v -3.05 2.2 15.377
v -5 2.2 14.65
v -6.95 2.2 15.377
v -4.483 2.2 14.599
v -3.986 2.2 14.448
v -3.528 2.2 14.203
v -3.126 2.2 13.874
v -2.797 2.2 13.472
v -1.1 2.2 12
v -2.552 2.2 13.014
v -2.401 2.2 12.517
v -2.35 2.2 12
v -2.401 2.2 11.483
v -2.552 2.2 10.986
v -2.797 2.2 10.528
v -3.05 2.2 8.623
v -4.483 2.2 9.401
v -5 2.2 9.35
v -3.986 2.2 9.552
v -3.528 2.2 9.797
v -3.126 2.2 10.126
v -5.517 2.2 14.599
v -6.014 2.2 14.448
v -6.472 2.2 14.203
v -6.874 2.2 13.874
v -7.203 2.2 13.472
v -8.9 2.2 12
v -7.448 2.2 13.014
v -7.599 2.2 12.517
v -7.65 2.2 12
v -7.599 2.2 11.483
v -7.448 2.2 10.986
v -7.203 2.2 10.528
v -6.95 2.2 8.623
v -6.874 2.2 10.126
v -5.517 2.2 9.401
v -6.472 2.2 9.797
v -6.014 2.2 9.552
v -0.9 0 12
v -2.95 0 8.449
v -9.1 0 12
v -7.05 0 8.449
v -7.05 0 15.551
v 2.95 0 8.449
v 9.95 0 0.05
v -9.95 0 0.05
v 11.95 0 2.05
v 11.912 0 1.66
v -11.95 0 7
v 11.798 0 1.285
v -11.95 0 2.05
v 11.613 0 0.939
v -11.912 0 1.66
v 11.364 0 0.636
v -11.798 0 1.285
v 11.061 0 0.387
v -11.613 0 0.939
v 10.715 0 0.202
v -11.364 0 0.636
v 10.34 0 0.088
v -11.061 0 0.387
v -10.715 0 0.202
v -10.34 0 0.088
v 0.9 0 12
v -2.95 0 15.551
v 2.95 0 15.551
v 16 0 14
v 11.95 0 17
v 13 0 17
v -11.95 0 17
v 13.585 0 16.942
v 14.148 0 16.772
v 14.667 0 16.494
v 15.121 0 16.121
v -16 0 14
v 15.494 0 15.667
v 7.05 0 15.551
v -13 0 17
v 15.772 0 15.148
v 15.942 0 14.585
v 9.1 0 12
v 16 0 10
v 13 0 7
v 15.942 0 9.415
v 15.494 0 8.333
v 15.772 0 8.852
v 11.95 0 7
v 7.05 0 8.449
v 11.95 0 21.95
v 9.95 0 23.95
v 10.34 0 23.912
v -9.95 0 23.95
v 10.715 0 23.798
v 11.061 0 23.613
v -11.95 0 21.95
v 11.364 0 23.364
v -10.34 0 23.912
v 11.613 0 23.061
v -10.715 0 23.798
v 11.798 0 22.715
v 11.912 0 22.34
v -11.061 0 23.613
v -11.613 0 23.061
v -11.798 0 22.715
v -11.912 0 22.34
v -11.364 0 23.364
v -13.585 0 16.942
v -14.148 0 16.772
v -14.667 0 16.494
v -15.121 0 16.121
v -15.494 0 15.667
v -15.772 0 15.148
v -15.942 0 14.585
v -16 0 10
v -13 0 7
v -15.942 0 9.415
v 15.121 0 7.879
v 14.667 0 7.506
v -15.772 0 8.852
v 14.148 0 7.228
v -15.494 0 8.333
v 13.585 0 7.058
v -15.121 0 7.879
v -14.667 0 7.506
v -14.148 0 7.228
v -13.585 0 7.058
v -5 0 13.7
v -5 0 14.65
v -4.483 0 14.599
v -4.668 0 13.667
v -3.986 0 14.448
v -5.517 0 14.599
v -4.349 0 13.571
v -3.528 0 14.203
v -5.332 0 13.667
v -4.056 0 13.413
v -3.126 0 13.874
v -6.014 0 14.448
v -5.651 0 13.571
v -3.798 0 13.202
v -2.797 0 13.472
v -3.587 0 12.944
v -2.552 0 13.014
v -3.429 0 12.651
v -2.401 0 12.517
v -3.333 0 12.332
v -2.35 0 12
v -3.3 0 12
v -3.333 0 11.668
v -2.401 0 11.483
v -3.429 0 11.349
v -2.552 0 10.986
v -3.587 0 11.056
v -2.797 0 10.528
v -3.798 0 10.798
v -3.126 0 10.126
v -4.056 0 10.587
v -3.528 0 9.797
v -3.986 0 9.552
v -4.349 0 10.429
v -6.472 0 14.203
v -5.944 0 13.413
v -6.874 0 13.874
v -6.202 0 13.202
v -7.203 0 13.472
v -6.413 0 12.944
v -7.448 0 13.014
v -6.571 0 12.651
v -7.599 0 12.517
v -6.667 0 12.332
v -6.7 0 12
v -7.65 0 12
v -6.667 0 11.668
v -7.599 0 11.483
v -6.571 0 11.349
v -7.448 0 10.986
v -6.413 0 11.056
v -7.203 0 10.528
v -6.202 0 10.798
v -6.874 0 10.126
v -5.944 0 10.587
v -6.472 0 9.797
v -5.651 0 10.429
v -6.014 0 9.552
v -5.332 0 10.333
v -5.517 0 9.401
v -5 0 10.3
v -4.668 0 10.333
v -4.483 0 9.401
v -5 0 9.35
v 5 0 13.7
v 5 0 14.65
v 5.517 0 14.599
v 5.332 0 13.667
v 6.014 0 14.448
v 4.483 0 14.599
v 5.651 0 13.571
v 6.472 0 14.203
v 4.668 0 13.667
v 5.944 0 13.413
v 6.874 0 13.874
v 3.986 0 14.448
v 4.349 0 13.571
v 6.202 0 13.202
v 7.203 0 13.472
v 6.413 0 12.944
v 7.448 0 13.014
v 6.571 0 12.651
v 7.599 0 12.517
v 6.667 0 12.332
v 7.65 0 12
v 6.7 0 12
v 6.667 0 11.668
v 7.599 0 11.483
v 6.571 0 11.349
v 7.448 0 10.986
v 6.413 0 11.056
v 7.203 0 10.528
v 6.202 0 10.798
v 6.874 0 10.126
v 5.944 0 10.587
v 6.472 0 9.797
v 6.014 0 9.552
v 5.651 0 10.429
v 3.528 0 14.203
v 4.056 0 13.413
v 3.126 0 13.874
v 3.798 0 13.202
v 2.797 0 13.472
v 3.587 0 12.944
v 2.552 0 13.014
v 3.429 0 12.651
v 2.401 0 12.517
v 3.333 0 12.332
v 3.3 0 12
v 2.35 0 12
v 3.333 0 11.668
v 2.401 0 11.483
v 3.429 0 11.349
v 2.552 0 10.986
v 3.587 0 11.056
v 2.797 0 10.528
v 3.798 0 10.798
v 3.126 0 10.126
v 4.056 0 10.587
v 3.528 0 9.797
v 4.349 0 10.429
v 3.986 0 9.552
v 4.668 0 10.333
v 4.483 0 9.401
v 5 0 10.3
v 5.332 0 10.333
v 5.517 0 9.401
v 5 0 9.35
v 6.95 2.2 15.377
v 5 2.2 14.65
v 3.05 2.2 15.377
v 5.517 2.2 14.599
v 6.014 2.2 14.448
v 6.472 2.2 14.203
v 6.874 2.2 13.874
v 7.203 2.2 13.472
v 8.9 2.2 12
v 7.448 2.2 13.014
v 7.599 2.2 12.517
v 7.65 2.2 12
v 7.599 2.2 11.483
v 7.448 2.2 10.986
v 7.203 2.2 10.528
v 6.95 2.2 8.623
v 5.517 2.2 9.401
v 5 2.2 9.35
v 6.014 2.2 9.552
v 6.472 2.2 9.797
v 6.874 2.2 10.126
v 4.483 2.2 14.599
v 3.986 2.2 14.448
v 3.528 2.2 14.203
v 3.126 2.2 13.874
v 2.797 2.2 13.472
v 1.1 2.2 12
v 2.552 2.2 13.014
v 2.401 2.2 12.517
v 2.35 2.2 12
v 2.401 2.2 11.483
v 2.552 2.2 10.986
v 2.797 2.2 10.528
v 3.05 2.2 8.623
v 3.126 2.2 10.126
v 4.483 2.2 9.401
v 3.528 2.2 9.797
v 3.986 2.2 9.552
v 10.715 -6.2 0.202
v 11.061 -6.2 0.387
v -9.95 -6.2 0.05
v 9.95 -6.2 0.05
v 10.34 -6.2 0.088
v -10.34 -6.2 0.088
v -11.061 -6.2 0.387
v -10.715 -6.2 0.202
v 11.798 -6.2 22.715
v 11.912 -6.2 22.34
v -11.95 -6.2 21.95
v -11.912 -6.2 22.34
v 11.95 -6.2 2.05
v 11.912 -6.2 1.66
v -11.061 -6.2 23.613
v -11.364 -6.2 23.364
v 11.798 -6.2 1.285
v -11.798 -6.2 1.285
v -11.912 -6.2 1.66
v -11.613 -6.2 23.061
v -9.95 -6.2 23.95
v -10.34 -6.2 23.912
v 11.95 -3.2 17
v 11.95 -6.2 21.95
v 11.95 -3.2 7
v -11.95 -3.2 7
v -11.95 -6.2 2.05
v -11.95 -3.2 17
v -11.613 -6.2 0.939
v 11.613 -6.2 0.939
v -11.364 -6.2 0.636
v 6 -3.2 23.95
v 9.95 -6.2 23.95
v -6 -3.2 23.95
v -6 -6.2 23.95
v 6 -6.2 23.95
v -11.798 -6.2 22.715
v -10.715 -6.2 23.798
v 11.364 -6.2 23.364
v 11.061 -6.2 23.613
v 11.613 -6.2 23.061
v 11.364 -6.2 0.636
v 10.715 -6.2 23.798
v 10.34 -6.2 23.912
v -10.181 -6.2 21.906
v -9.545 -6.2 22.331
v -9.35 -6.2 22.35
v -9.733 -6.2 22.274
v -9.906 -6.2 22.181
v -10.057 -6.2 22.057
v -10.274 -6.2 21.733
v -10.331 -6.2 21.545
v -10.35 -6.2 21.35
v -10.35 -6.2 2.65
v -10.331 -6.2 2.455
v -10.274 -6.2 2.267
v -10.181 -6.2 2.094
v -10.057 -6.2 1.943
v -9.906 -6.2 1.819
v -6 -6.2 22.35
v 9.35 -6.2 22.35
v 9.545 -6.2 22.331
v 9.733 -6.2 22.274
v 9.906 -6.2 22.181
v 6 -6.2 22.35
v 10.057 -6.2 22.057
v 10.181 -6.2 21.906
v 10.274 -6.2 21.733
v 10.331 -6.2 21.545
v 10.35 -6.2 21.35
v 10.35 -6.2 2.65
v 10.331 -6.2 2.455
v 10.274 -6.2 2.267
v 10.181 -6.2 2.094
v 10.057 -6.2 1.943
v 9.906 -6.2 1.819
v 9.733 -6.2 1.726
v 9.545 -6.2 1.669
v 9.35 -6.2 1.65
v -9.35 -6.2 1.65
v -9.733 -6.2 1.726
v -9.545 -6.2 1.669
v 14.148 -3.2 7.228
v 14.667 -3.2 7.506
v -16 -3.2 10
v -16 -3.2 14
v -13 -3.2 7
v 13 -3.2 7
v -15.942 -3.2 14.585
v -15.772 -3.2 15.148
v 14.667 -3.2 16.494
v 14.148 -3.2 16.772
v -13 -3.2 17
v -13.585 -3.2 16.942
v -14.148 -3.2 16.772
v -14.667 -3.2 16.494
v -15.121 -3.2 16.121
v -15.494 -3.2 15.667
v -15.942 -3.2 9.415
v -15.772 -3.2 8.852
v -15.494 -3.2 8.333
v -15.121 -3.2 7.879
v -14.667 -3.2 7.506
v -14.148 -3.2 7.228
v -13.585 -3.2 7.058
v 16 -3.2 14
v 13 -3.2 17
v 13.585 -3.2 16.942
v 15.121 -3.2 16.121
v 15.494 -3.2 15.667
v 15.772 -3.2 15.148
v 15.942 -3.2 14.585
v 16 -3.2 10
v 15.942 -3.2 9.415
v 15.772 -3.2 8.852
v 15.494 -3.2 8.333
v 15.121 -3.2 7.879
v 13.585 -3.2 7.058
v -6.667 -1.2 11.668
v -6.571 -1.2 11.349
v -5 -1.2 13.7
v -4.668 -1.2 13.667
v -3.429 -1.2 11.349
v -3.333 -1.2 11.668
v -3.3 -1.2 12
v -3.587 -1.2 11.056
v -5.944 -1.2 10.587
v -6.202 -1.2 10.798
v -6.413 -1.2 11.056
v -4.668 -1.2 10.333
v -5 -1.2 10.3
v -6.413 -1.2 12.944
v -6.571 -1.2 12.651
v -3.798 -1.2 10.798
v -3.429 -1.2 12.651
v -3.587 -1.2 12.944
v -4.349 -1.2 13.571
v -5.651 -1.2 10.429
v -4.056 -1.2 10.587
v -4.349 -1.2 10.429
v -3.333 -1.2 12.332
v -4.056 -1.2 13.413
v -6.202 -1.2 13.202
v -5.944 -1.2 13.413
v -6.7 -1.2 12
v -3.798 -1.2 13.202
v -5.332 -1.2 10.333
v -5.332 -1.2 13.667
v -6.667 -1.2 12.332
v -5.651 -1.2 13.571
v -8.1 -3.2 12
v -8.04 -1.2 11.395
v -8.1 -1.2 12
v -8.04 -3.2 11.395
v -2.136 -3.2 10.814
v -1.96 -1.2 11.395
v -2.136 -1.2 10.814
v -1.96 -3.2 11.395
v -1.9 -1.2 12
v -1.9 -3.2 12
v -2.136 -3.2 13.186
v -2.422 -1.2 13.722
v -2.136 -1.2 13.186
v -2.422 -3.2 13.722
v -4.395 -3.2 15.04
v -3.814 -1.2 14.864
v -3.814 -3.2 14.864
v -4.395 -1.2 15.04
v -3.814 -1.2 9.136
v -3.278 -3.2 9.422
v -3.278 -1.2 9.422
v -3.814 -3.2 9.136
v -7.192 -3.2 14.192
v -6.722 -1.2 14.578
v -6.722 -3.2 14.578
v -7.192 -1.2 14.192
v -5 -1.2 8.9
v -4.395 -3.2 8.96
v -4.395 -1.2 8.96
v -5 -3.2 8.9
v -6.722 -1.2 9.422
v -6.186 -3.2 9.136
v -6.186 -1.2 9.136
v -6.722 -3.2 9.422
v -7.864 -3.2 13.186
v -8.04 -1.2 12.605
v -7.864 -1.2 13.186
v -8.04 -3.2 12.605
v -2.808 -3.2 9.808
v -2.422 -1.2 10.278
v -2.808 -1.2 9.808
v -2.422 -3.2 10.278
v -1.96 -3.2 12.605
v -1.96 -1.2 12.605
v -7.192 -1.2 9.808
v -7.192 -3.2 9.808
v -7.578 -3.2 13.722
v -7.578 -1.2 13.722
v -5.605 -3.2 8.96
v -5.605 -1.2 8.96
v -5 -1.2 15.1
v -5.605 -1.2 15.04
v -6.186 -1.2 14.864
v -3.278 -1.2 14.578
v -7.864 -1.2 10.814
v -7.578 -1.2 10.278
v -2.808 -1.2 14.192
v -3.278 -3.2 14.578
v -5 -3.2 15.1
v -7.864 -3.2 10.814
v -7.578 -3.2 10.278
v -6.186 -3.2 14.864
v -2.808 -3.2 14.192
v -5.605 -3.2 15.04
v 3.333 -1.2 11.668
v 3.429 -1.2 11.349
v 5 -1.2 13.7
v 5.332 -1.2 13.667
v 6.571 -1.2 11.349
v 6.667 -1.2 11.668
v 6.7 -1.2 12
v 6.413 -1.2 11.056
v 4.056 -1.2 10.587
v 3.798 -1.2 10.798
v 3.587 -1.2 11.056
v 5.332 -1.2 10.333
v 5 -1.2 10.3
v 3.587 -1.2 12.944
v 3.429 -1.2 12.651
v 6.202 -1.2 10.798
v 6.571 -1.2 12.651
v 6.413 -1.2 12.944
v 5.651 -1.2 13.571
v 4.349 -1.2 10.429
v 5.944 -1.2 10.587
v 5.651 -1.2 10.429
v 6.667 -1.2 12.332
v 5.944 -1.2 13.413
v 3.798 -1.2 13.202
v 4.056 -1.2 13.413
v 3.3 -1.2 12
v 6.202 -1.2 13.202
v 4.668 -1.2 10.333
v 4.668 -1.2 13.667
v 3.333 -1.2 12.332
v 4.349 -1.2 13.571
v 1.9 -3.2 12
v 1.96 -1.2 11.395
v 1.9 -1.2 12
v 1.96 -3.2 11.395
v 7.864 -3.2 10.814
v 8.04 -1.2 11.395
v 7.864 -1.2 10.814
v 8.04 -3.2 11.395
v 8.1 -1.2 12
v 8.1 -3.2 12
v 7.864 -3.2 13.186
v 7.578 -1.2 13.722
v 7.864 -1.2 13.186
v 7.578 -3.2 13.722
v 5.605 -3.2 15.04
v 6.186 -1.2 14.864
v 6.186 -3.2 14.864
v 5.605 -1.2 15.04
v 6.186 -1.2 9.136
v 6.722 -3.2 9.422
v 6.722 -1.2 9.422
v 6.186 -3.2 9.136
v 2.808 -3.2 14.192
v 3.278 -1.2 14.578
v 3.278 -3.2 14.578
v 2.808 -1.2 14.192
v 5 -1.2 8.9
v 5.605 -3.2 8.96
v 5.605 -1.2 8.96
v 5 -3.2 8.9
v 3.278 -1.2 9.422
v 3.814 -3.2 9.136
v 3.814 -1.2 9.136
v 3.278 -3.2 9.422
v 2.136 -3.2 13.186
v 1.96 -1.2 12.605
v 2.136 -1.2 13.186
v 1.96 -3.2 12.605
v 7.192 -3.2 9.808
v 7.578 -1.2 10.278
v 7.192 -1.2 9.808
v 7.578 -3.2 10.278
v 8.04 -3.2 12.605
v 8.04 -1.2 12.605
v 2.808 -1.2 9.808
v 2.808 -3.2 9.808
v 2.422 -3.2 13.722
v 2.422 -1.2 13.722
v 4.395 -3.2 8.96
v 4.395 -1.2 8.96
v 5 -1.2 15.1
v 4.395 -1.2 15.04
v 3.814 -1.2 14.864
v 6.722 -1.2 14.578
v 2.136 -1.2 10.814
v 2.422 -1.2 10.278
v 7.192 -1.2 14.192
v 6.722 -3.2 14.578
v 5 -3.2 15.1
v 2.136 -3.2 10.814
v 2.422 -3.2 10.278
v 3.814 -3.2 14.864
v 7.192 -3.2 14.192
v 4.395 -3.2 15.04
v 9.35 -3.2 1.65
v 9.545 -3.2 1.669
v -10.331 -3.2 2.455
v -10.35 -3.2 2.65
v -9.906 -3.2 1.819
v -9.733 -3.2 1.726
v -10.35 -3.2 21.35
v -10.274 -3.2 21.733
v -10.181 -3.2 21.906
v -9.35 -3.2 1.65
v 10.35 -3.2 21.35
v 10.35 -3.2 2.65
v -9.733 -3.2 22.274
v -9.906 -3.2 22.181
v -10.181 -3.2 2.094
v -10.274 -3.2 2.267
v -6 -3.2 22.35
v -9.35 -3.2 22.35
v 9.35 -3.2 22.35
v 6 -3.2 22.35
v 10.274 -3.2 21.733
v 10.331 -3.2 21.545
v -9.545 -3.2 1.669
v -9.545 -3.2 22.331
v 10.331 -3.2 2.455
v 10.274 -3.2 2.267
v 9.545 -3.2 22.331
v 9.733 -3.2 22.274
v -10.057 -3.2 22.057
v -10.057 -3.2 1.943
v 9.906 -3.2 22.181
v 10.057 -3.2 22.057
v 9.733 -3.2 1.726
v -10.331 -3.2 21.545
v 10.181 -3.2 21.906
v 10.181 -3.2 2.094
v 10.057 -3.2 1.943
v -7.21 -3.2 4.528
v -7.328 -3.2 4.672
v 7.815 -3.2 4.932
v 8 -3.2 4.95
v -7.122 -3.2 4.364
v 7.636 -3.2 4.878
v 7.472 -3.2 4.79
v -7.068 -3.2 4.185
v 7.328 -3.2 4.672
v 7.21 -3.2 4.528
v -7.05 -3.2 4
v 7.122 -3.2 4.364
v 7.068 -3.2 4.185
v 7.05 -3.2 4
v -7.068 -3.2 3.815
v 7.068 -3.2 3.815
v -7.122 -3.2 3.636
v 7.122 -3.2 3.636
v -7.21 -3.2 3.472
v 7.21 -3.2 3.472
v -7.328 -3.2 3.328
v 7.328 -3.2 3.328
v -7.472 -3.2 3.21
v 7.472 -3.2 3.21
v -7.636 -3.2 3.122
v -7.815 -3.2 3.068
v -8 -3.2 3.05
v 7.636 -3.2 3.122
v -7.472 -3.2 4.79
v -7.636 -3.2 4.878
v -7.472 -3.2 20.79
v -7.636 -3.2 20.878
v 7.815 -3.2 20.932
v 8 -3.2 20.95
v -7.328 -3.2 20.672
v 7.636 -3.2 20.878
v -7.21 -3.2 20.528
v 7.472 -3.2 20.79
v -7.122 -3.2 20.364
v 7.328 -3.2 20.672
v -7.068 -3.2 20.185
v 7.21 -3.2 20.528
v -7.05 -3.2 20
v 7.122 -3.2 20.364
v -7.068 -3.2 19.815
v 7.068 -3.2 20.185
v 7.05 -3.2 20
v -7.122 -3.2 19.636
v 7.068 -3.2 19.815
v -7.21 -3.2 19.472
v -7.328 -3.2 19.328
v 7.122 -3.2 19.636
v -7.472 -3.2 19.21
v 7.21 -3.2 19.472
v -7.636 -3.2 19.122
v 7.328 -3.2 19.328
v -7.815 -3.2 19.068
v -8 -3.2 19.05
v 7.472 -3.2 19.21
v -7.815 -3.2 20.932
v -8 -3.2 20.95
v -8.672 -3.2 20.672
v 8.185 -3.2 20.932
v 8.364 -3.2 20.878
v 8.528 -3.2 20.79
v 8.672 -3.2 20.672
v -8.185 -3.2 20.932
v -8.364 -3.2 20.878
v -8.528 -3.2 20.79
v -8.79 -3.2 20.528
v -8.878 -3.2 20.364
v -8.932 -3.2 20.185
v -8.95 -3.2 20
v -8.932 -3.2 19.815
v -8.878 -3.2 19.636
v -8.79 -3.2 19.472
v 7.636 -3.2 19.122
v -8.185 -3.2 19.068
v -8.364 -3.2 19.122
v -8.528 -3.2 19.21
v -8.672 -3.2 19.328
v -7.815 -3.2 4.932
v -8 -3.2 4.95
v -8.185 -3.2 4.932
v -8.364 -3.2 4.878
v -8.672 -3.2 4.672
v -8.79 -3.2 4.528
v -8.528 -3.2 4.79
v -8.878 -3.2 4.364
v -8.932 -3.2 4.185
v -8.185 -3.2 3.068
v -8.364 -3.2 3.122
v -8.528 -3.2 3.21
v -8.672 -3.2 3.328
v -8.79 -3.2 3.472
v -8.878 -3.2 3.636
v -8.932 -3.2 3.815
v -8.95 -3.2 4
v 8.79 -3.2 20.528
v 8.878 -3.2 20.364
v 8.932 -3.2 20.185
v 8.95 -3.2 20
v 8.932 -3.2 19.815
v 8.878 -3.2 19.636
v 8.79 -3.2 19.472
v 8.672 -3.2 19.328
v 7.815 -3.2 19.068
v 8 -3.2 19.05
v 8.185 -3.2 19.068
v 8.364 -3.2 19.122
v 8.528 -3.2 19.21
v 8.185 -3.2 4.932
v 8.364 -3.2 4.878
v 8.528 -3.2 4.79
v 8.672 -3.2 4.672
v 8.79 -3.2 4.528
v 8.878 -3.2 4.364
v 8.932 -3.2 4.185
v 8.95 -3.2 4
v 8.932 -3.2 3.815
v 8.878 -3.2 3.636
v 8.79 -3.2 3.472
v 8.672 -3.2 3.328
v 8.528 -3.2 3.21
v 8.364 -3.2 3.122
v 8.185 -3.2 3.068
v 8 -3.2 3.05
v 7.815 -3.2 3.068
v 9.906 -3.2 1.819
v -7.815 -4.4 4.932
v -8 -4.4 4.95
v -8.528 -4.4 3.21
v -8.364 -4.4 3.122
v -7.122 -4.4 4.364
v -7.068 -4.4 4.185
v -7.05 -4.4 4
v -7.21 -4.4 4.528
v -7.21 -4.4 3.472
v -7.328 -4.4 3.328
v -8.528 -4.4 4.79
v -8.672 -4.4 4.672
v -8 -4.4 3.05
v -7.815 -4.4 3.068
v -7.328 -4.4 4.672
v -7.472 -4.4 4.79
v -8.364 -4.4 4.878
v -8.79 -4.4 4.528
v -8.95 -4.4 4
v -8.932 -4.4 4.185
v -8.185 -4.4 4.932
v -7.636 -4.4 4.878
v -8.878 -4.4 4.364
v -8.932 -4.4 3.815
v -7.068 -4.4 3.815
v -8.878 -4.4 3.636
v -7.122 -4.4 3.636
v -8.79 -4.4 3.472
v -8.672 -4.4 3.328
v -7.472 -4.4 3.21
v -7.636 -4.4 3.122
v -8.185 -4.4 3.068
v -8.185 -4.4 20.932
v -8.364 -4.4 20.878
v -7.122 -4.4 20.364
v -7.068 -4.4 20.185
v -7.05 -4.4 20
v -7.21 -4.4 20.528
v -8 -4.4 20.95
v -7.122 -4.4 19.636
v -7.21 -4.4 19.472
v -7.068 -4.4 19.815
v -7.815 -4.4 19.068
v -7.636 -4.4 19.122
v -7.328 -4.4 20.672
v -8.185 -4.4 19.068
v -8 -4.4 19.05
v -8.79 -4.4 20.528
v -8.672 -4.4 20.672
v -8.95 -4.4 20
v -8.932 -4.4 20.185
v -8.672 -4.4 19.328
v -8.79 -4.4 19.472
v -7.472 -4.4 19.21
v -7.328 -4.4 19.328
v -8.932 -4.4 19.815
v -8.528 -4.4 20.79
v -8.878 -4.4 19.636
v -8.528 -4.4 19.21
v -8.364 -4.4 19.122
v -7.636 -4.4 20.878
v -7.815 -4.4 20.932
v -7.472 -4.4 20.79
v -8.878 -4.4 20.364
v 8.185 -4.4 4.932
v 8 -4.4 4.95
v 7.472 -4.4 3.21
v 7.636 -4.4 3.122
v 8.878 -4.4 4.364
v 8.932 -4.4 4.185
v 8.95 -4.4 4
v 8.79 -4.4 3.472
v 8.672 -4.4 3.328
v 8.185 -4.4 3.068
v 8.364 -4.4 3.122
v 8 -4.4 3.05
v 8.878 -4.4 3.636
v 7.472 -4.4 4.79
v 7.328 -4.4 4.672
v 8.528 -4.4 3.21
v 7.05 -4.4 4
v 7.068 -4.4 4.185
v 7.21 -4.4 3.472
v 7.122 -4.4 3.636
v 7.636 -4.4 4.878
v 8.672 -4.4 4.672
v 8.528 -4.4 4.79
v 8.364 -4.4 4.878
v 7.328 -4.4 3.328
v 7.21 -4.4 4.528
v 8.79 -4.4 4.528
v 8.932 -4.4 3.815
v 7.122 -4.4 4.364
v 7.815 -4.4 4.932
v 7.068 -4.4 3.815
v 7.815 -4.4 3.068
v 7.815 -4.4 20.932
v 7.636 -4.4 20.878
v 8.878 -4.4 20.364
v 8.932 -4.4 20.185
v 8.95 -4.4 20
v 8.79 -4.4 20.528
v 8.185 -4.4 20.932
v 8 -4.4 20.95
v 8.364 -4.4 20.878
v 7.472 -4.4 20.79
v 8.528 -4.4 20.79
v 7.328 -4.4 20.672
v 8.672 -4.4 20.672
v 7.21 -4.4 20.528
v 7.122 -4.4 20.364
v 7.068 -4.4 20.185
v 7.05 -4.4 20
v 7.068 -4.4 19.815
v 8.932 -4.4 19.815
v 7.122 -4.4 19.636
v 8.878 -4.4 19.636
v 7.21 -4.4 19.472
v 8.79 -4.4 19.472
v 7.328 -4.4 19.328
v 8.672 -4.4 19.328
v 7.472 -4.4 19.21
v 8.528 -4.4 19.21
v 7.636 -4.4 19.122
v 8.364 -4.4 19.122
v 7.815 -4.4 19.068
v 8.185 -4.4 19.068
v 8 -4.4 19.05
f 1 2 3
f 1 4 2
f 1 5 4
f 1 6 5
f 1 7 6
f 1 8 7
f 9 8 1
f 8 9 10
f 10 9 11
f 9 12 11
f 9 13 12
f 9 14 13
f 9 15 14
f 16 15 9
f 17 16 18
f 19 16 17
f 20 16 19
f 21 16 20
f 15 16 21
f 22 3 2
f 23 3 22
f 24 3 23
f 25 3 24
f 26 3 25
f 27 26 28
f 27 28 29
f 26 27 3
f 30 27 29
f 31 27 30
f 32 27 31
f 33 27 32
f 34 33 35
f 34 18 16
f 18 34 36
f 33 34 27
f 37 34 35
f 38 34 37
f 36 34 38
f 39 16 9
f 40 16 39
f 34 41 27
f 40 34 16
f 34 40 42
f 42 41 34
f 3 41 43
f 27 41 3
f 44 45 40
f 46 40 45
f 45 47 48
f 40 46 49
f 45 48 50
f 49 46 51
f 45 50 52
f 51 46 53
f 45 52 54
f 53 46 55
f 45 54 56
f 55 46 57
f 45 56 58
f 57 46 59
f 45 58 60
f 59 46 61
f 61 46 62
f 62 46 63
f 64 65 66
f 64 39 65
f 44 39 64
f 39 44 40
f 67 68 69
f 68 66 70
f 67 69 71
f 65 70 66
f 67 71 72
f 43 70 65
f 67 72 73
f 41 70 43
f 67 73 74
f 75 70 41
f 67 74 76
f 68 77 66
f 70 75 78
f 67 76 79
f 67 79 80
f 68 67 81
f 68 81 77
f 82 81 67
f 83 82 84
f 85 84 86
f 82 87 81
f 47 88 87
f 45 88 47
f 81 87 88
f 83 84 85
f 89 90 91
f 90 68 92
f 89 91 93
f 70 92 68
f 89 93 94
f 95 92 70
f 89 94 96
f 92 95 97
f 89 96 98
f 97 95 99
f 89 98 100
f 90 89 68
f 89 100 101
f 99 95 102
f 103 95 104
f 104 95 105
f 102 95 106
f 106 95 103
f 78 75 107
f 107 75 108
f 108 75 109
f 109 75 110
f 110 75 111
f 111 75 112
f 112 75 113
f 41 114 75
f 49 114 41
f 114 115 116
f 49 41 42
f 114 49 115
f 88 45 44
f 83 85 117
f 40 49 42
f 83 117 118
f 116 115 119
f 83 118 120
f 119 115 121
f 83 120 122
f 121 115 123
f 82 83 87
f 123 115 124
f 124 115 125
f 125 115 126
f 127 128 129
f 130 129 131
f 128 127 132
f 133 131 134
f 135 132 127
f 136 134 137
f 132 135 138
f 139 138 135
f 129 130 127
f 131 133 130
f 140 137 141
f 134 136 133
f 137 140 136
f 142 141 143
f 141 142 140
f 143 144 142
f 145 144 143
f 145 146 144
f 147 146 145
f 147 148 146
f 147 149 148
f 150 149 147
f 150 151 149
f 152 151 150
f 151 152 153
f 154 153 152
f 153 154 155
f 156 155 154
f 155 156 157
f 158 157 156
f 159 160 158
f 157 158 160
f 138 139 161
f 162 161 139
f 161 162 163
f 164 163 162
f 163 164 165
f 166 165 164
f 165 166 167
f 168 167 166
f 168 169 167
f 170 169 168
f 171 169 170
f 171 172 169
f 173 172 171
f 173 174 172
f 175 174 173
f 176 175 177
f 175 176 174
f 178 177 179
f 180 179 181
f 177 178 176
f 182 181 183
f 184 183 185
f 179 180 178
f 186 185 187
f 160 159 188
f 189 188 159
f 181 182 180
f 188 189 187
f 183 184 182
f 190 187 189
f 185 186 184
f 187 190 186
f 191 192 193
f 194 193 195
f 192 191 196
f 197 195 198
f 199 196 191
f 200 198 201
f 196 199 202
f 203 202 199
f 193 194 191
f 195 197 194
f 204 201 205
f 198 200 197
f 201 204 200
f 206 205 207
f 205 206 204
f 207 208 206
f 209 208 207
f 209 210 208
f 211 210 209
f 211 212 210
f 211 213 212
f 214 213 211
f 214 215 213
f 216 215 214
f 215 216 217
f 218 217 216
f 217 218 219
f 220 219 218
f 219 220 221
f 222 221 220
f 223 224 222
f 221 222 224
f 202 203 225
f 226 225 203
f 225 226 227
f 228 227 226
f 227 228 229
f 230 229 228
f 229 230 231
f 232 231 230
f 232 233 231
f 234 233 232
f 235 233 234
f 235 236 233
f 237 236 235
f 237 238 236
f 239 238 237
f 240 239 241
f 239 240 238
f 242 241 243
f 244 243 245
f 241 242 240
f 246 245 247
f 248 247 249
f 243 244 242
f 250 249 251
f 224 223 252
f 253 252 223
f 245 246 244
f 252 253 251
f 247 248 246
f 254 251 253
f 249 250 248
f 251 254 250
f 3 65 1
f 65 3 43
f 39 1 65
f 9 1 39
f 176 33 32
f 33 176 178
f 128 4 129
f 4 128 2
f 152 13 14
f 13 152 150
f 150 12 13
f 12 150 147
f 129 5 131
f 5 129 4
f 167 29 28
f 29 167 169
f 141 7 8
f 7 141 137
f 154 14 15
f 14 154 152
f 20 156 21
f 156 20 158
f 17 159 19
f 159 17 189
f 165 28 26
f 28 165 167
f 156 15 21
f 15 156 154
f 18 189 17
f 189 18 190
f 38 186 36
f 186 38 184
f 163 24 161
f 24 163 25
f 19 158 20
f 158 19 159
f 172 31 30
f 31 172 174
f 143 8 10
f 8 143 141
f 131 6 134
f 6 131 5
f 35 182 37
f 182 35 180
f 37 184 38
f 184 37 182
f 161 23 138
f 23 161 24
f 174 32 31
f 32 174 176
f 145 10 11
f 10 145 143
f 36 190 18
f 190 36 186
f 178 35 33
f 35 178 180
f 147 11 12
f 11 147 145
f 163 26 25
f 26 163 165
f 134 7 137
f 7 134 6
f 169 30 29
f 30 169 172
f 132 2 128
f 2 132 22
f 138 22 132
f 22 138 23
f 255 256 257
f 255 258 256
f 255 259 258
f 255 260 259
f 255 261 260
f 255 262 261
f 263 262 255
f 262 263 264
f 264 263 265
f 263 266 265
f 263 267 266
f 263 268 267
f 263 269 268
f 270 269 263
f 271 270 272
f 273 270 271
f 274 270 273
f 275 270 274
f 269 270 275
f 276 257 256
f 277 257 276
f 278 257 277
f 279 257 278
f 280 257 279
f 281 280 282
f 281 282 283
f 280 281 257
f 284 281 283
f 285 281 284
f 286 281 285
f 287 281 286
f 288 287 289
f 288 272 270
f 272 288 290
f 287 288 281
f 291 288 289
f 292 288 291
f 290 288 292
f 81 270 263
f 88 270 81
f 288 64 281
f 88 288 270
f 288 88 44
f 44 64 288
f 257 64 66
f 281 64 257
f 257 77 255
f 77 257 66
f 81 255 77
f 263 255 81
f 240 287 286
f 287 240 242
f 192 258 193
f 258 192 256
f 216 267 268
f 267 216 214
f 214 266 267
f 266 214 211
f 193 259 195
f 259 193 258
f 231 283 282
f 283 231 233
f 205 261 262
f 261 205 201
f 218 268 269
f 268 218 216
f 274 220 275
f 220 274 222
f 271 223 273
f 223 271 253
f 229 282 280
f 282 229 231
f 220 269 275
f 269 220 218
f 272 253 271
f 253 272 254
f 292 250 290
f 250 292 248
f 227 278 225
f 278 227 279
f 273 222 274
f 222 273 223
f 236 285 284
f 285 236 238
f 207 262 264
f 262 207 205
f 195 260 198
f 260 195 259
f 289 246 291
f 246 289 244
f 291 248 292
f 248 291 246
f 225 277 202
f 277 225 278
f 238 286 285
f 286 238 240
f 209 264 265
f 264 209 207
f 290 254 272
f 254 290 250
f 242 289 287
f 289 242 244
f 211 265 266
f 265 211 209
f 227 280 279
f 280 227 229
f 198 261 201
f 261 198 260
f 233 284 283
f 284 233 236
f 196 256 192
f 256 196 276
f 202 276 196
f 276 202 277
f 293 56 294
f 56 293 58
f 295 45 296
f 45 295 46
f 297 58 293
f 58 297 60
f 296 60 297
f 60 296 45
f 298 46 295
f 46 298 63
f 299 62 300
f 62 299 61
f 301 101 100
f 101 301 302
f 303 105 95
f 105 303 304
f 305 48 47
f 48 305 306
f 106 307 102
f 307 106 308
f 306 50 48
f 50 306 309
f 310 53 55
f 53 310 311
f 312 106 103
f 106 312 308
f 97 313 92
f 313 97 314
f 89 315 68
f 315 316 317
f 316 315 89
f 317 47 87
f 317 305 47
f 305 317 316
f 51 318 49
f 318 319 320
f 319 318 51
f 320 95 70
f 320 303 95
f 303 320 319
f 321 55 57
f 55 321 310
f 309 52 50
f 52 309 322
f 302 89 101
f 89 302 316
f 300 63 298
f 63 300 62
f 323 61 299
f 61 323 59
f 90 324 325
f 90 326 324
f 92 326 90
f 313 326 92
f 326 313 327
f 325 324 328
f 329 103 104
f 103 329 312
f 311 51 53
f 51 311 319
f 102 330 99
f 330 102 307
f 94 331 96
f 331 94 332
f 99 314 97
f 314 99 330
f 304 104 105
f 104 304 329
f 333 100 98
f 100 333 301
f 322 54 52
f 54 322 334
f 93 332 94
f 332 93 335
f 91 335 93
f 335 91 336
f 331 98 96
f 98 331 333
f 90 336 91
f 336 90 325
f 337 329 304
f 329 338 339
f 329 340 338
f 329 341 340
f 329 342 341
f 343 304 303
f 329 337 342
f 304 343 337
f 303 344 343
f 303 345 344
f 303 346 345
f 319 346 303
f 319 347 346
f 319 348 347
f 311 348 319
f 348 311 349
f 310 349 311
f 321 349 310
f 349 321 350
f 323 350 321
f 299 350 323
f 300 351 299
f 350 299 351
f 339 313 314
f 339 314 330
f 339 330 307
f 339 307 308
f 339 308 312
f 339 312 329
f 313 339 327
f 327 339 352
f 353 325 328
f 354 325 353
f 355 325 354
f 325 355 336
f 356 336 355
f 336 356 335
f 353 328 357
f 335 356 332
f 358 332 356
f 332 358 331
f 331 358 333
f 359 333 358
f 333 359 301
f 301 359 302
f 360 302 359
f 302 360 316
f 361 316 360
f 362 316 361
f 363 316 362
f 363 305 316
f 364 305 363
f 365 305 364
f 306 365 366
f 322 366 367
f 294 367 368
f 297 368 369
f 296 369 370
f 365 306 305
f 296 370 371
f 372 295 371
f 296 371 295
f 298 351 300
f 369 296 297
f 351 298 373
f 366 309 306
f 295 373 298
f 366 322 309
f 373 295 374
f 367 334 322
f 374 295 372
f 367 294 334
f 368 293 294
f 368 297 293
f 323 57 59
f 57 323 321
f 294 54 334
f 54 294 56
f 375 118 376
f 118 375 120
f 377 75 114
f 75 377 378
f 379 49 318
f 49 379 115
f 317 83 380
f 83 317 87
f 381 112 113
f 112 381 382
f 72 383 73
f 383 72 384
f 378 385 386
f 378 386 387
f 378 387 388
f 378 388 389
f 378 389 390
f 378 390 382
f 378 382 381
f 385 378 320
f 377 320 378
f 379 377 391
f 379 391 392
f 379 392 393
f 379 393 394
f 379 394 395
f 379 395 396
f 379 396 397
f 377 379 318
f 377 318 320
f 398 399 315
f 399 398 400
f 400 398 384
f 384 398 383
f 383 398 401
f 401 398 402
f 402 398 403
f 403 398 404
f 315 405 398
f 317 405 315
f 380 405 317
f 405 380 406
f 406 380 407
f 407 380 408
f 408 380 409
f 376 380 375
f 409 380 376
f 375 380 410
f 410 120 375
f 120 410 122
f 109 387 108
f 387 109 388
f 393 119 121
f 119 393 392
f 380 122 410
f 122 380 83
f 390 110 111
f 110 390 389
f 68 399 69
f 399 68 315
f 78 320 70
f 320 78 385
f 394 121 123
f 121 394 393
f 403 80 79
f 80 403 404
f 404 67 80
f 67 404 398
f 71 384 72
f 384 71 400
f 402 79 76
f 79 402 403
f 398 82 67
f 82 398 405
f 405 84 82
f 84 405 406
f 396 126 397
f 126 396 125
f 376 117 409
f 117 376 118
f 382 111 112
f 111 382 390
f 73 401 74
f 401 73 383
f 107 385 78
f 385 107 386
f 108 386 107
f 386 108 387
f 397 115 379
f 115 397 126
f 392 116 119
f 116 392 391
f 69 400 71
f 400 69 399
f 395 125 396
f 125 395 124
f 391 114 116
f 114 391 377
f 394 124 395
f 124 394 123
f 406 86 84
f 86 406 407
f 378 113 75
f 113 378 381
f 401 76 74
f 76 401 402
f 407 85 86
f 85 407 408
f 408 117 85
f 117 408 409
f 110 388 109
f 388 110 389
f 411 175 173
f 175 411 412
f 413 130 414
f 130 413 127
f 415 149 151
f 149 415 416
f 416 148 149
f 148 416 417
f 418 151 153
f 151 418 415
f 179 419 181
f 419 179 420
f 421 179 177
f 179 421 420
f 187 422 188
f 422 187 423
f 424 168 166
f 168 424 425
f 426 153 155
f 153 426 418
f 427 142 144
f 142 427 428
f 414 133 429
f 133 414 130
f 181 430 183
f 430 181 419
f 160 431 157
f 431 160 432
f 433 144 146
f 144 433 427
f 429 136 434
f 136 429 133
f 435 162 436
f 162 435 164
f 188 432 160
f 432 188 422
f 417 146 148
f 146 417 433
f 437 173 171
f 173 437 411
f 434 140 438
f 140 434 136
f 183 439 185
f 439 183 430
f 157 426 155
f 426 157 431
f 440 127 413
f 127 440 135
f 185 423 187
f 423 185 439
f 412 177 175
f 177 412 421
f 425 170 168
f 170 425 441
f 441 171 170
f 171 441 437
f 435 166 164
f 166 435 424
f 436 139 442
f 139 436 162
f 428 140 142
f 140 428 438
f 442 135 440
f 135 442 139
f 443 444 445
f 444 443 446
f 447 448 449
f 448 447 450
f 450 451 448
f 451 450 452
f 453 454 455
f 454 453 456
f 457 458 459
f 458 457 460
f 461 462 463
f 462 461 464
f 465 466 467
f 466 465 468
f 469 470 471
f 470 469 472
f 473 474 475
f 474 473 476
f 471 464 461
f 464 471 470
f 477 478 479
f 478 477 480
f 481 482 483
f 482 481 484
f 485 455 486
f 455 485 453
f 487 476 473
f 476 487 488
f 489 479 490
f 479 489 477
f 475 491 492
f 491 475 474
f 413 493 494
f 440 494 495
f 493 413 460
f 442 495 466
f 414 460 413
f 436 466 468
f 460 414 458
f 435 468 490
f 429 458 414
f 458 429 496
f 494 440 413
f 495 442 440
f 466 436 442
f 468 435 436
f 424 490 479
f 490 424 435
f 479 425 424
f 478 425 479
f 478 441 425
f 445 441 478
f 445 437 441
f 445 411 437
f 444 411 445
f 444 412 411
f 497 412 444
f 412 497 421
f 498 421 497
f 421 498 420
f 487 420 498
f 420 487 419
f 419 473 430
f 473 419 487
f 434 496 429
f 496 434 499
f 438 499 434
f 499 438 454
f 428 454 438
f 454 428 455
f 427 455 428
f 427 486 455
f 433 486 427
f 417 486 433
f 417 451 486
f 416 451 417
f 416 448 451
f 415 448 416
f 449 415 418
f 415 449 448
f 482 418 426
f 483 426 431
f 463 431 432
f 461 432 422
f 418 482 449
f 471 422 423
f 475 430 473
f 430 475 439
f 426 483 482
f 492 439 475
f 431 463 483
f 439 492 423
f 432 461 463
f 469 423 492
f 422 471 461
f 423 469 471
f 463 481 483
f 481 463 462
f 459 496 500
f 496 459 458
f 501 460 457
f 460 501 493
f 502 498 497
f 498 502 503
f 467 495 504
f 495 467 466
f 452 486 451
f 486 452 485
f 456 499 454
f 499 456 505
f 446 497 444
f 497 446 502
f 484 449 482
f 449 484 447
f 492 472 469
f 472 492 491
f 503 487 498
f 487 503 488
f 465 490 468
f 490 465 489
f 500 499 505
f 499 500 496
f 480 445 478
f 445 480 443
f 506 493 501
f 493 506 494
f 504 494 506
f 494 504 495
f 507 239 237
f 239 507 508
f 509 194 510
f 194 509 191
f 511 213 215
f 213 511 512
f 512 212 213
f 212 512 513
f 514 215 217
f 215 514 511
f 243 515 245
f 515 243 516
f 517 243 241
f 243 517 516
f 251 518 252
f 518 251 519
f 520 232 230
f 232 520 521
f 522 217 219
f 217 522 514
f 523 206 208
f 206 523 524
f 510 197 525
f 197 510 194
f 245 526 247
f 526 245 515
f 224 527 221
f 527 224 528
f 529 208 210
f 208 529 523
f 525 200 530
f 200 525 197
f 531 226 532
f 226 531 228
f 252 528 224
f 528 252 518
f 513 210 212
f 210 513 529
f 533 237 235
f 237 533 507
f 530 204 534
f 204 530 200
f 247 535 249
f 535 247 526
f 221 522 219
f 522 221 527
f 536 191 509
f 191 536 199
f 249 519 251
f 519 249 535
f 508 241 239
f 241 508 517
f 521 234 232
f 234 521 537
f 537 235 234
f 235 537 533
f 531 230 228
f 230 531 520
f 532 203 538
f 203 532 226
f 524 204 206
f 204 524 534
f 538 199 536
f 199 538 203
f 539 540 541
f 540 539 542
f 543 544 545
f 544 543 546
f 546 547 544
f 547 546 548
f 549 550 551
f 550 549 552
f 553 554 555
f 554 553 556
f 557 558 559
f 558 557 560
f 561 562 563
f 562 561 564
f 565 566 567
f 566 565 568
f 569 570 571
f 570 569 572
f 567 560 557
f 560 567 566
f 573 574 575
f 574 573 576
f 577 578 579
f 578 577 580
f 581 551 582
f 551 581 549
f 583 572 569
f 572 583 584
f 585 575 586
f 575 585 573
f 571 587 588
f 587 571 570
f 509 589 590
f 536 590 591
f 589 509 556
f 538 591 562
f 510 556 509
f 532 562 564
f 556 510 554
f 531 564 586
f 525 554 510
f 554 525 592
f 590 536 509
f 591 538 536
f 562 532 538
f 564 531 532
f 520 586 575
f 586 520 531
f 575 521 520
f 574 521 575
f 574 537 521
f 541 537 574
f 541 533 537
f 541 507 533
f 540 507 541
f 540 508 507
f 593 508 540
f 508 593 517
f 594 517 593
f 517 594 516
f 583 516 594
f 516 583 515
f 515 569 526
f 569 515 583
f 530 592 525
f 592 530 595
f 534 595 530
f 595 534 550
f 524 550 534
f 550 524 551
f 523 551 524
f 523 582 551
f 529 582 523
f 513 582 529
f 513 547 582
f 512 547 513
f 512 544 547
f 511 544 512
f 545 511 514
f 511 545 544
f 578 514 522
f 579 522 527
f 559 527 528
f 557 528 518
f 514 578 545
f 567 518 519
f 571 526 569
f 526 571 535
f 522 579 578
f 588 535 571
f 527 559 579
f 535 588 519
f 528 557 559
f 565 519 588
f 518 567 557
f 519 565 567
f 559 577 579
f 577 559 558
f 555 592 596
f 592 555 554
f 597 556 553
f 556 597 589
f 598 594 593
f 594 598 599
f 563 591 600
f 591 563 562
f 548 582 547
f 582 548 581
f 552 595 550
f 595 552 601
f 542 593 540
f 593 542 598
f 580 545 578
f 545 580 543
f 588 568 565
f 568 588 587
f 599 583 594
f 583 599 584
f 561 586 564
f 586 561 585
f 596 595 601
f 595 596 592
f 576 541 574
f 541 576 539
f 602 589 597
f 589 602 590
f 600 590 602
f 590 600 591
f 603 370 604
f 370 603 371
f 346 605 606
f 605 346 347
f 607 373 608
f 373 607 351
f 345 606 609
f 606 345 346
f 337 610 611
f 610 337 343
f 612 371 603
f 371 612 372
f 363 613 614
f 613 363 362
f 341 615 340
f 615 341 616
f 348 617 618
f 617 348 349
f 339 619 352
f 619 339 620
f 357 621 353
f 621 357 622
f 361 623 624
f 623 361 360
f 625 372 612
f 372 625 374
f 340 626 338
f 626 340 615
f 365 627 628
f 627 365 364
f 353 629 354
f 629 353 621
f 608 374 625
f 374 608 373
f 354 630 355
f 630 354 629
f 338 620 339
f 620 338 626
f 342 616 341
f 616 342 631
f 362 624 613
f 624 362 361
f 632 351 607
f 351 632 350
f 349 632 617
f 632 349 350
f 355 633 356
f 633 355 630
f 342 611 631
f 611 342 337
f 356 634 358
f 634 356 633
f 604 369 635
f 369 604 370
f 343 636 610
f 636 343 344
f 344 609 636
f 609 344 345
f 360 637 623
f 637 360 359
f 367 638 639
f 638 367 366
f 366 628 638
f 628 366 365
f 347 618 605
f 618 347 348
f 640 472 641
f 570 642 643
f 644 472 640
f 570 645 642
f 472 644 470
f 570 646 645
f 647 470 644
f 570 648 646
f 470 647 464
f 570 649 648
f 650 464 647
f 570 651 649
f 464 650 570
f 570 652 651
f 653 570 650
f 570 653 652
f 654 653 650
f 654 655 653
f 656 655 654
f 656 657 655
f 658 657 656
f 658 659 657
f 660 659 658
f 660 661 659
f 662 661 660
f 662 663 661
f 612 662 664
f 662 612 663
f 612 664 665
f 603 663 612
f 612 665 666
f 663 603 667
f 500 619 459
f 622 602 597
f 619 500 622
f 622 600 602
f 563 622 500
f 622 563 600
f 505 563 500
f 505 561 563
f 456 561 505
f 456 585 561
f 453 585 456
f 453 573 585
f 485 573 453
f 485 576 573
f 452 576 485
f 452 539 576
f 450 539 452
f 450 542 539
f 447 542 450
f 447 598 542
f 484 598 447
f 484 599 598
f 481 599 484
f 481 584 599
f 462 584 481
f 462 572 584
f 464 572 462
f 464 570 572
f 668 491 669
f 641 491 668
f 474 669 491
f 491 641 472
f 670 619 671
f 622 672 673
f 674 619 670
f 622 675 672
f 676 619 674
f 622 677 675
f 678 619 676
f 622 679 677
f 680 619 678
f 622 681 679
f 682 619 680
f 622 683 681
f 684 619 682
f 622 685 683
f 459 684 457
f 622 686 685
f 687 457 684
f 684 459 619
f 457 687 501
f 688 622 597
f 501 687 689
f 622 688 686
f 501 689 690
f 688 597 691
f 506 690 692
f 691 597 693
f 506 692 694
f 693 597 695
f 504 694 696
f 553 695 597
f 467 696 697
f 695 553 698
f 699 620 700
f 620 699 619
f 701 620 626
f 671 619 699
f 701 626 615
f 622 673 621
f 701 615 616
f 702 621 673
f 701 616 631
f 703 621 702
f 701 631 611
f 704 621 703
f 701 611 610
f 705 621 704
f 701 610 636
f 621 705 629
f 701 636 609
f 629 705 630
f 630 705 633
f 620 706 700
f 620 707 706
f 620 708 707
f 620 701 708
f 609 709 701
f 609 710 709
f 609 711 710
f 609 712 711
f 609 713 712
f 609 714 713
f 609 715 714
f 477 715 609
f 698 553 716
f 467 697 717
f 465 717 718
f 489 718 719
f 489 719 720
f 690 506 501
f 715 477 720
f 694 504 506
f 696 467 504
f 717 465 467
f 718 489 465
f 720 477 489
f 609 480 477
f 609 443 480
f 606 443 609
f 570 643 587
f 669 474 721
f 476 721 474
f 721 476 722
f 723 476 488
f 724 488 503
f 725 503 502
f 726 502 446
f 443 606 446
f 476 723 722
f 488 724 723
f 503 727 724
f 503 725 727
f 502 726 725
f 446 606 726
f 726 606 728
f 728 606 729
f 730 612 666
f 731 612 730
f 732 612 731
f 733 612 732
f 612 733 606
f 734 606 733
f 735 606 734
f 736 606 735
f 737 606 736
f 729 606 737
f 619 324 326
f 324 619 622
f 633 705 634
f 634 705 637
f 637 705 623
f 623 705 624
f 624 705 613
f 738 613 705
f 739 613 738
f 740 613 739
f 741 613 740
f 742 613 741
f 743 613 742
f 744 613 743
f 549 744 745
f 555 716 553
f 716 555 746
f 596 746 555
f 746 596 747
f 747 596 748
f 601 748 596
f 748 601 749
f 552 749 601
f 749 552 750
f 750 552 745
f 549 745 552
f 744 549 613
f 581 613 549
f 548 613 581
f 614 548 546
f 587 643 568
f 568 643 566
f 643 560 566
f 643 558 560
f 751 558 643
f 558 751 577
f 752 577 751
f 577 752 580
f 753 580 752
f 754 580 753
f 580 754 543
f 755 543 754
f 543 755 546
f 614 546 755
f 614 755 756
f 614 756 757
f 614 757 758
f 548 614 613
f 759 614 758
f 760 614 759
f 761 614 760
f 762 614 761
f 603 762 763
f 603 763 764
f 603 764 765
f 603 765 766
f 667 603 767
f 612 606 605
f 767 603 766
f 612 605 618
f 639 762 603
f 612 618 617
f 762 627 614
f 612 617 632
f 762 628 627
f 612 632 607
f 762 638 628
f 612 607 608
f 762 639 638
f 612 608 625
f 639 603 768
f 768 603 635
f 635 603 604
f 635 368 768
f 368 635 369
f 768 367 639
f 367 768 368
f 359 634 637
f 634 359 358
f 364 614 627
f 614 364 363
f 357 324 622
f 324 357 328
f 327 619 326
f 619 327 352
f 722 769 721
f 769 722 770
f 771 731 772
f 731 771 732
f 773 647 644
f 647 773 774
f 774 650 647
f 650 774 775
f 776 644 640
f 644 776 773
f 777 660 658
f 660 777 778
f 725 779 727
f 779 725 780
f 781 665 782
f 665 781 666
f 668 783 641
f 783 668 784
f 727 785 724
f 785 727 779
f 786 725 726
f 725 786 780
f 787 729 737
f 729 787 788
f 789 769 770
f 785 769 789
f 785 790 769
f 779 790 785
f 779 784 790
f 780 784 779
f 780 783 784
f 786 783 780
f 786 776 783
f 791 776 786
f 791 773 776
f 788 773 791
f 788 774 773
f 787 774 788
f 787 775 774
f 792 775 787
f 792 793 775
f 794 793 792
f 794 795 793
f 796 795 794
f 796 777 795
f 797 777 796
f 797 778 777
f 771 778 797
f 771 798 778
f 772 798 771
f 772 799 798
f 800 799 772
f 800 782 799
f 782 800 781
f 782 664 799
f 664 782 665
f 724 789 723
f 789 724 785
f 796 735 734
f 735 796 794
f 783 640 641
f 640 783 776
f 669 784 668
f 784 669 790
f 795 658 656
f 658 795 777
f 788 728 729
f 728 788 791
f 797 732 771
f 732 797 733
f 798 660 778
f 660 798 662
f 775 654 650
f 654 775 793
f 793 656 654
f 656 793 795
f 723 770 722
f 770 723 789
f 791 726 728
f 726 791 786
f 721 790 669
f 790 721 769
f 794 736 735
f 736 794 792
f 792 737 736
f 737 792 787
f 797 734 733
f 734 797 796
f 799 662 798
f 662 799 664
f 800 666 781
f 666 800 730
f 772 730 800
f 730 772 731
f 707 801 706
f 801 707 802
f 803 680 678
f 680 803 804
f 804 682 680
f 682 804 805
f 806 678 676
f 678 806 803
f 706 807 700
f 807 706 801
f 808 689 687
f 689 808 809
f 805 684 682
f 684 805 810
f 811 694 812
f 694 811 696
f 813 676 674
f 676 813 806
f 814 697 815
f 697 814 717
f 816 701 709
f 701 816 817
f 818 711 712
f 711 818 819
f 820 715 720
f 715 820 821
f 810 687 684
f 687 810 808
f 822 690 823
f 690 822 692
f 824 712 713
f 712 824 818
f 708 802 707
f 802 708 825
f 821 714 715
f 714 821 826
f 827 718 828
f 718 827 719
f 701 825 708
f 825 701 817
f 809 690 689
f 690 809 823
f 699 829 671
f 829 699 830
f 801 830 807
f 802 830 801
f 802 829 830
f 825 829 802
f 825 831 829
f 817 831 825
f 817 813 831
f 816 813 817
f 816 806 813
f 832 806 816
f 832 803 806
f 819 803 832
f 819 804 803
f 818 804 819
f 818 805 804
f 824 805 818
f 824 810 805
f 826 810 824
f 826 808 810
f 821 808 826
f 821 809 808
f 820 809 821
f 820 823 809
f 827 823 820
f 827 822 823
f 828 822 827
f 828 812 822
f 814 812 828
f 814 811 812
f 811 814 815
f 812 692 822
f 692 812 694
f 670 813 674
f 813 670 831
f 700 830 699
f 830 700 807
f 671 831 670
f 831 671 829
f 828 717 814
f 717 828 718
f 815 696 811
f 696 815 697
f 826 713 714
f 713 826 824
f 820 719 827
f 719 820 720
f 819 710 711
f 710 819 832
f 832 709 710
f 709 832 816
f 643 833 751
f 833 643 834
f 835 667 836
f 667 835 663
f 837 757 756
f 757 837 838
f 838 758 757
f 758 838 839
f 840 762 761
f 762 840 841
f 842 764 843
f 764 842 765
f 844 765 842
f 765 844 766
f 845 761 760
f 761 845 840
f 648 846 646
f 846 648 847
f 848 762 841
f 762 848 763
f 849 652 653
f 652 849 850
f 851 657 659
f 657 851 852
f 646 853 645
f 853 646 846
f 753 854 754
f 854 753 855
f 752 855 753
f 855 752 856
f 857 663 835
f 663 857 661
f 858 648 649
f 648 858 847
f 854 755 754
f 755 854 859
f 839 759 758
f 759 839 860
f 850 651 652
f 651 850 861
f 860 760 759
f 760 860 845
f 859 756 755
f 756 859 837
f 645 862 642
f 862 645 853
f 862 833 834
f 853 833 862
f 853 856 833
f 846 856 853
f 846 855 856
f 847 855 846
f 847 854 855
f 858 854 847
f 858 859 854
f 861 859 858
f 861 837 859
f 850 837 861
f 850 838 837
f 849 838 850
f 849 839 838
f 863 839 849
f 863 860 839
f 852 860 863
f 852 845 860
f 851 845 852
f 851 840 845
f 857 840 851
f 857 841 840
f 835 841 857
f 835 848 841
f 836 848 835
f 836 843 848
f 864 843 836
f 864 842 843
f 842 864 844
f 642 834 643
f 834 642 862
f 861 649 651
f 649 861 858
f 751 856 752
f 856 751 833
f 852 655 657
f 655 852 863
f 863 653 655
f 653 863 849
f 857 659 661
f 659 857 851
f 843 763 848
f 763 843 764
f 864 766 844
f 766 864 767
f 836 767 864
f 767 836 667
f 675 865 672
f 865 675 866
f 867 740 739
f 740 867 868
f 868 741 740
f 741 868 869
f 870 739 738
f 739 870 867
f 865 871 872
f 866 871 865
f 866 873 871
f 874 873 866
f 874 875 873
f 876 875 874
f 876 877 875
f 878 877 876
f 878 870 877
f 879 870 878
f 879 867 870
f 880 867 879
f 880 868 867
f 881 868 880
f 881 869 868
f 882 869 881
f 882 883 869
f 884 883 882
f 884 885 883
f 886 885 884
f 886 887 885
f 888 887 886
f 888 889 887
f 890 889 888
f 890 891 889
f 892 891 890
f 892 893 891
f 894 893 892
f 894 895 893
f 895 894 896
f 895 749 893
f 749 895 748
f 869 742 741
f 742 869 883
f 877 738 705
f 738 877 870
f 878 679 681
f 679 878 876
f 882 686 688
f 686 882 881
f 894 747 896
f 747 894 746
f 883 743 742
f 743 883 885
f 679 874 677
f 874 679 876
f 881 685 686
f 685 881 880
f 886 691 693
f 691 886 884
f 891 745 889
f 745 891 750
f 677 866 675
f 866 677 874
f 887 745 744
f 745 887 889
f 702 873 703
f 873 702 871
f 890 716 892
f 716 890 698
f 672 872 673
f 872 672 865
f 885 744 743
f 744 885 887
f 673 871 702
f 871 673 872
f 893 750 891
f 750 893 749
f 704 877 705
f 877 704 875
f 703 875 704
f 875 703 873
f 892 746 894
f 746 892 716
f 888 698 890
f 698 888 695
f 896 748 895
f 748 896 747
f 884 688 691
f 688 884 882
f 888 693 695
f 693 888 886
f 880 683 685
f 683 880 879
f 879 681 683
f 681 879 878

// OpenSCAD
// file: rm_common.scad
// RobotMind: solid, double-sided panels with one blind mounting interface
// and hermaphrodite battlement edges. All dimensions are millimetres.
$fn = 32;

RM_EPS = 0.1;
RM_UNIT = 40;
RM_GRID = 10;
RM_EDGE_MARGIN = RM_GRID/2;
RM_PANEL_T = 8;
RM_CORNER_R = 3;
RM_FIT = 0; // positive is looser; tune in 0.05 mm steps

// One hexagonal blind port. The hexagonal ring accepts a tool-free peg; the
// circular centre boss accepts an optional M3 screw without piercing the
// opposite face.
RM_PORT_OD = 8;
RM_PORT_BOSS_D = 5;
RM_PORT_DEPTH = 2.2;
RM_PORT_PILOT_D = 2.7;
RM_PORT_PILOT_DEPTH = 3;
RM_PEG_ENTRY = 0.2;
RM_PEG_GRIP = 0.2;
RM_PEG_INNER_CLEARANCE = 0.3;

RM_M3_CLEARANCE = 3.4;
RM_M3_HEAD_D = 6.2;
RM_M3_HEAD_DEPTH = 2;

// Hermaphrodite battlement edge. Every panel is identical and point
// symmetric: north and west edges lead with a tab, south and east with a
// socket, so any edge mates any neighbouring edge with no connector parts.
// Flips are always allowed; 90-degree in-plane twists are not.
RM_TAB_W = 6;     // feature width along the edge
RM_TAB_T = 3;     // feature thickness, centred in the panel
RM_TAB_PROUD = 4; // tab protrusion == socket depth

function rm_tab_w() = RM_TAB_W-2*RM_FIT;
function rm_socket_w() = RM_TAB_W+2*RM_FIT;
function rm_port_od() = RM_PORT_OD+2*RM_FIT;
function rm_port_boss_d() = RM_PORT_BOSS_D-2*RM_FIT;
function rm_pilot_d() = RM_PORT_PILOT_D+2*RM_FIT;
function rm_peg_root_od(delta=0) = RM_PORT_OD+RM_PEG_GRIP-2*RM_FIT+delta;
function rm_peg_tip_od(delta=0) = RM_PORT_OD-RM_PEG_ENTRY-2*RM_FIT+delta;
function rm_peg_id() = RM_PORT_BOSS_D+RM_PEG_INNER_CLEARANCE+2*RM_FIT;

function grid_count(span) = floor((span-2*RM_EDGE_MARGIN)/RM_GRID)+1;
function grid_position(i,span) = -span/2+RM_EDGE_MARGIN+i*RM_GRID;

assert(RM_UNIT%RM_GRID == 0, "The unit must contain a whole mounting grid");
assert(grid_count(RM_UNIT) == 4,
       "The 40 mm unit must expose a 4x4 port grid");
assert(RM_PANEL_T > 2*RM_PORT_PILOT_DEPTH,
       "Blind pilots need a continuous membrane");
assert(rm_peg_root_od() > rm_port_od() &&
       rm_port_od() > rm_peg_tip_od(),
       "RM_FIT is outside the hexagonal peg range");
assert(rm_peg_id() > rm_port_boss_d() &&
       rm_port_boss_d() > rm_pilot_d(),
       "The port boss must separate peg and screw fits");
assert(RM_GRID-RM_PORT_OD > 1,
       "Mounting ports need enough material between them");
assert(RM_PANEL_T-RM_TAB_T >= 4, "Battlements need 2 mm skins");
assert(RM_TAB_W < RM_GRID, "Battlements must clear each other and corners");

module rounded_box(size=[20,20,3], r=2) {
  linear_extrude(height=size[2])
    offset(r=r) offset(delta=-r) square([size[0],size[1]]);
}

module rounded_panel(size=[RM_UNIT,RM_UNIT], t=RM_PANEL_T,
                     r=RM_CORNER_R) {
  translate([-size[0]/2,-size[1]/2,0]) rounded_box([size[0],size[1],t],r);
}

// Cut from a face at Z=0 into material extending in +Z.
module blind_port_cut(depth=RM_PORT_DEPTH,
                      pilot_d=rm_pilot_d(),
                      pilot_depth=RM_PORT_PILOT_DEPTH) {
  union() {
    difference() {
      translate([0,0,-RM_EPS])
        cylinder(h=depth+RM_EPS,d=rm_port_od(),$fn=6);
      translate([0,0,-2*RM_EPS])
        cylinder(h=depth+3*RM_EPS,d=rm_port_boss_d());
    }
    translate([0,0,-RM_EPS])
      cylinder(h=pilot_depth+RM_EPS,d=pilot_d);
  }
}

module face_port_cuts(size=[RM_UNIT,RM_UNIT], top=false) {
  for(ix=[0:grid_count(size[0])-1], iy=[0:grid_count(size[1])-1]) {
    p=[grid_position(ix,size[0]),grid_position(iy,size[1])];
    if(top)
      translate([p[0],p[1],RM_PANEL_T]) mirror([0,0,1]) blind_port_cut();
    else
      translate([p[0],p[1],0]) blind_port_cut();
  }
}

module panel(size=[RM_UNIT,RM_UNIT]) {
  assert(size[0]%RM_UNIT == 0 && size[1]%RM_UNIT == 0,
         "Panel dimensions must be whole 40 mm units");
  hw=size[0]/2;
  hh=size[1]/2;
  difference() {
    union() {
      rounded_panel(size);
      edge_run_x(size[0], hh, 1, 0);   // north leads with a tab
      edge_run_x(size[0], -hh, -1, 1); // south leads with a socket
      edge_run_y(size[1], hw, 1, 1);   // east leads with a socket
      edge_run_y(size[1], -hw, -1, 0); // west leads with a tab
    }
    face_port_cuts(size);
    face_port_cuts(size,true);
  }
}

// Every carrier reuses this exact integral hexagonal peg.
module mount_peg(delta=0, h=RM_PORT_DEPTH) {
  difference() {
    cylinder(h=h,
             d1=rm_peg_root_od(delta),d2=rm_peg_tip_od(delta),$fn=6);
    translate([0,0,-RM_EPS])
      cylinder(h=h+2*RM_EPS,d=rm_peg_id());
  }
}

// Cut from an exposed surface at Z=0 into material extending in +Z.
module optional_screw_cut(depth=RM_PANEL_T) {
  translate([0,0,-RM_EPS])
    cylinder(h=depth+2*RM_EPS,d=RM_M3_CLEARANCE);
  translate([0,0,-RM_EPS])
    cylinder(h=RM_M3_HEAD_DEPTH+RM_EPS,d=RM_M3_HEAD_D);
}

// Battlement primitives. phase 0 puts tabs on even grid indices, phase 1 on
// odd indices. Edges running along X sit at y=y0 and open toward sy; edges
// along Y sit at x=x0 and open toward sx.
module _tab(x, y0, sy) {
  translate([x-RM_TAB_W/2,
             sy>0 ? y0 : y0-RM_TAB_PROUD,
             (RM_PANEL_T-RM_TAB_T)/2])
    cube([RM_TAB_W,RM_TAB_PROUD,RM_TAB_T]);
}

module _socket(x, y0, sy) {
  translate([x-rm_socket_w()/2,
             sy>0 ? y0-RM_TAB_PROUD-RM_EPS : y0-RM_EPS,
             (RM_PANEL_T-RM_TAB_T)/2])
    cube([rm_socket_w(),RM_TAB_PROUD+2*RM_EPS,RM_TAB_T]);
}

module edge_run_x(length, y0, sy, phase) {
  for(i=[0:grid_count(length)-1])
    if(i%2 == phase)
      _tab(grid_position(i,length),y0,sy);
    else
      _socket(grid_position(i,length),y0,sy);
}

module edge_run_y(length, x0, sx, phase) {
  for(i=[0:grid_count(length)-1])
    if(i%2 == phase)
      translate([sx>0 ? x0 : x0-RM_TAB_PROUD,
                 grid_position(i,length)-RM_TAB_W/2,
                 (RM_PANEL_T-RM_TAB_T)/2])
        cube([RM_TAB_PROUD,RM_TAB_W,RM_TAB_T]);
    else
      translate([sx>0 ? x0-RM_TAB_PROUD-RM_EPS : x0-RM_EPS,
                 grid_position(i,length)-rm_socket_w()/2,
                 (RM_PANEL_T-RM_TAB_T)/2])
        cube([RM_TAB_PROUD+2*RM_EPS,rm_socket_w(),RM_TAB_T]);
}
// main file
include <rm_common.scad>

module grove_20x20_carrier() {
  pcb=[20,20];
  clearance=0.35+RM_FIT;
  wall=1.6;
  wall_h=3;
  floor=3.2;
  peg_d=1.9-2*RM_FIT;
  pocket=[pcb[0]+2*clearance,pcb[1]+2*clearance];
  outer=[pocket[0]+2*wall,pocket[1]+2*wall];
  assert(peg_d > 0, "RM_FIT makes the Grove pegs invalid");
  difference() {
    union() {
      translate([-outer[0]/2,-outer[1]/2,0])
        rounded_box([outer[0],outer[1],floor+wall_h],2);
      translate([-16,-5,0]) rounded_box([32,10,floor],3);
      for(x=[-RM_EDGE_MARGIN,RM_EDGE_MARGIN])
        translate([x,0,0]) rotate([180,0,0]) mount_peg();
    }
    translate([-pocket[0]/2,-pocket[1]/2,floor])
      rounded_box([pocket[0],pocket[1],wall_h+RM_EPS],1);
    translate([-6,outer[1]/2-wall-RM_EPS,floor])
      cube([12,2*wall+2*RM_EPS,wall_h+RM_EPS]);
    for(x=[-RM_EDGE_MARGIN,RM_EDGE_MARGIN])
      translate([x,0,floor]) rotate([180,0,0])
        optional_screw_cut(floor+RM_PORT_DEPTH);
  }
  for(x=[-8,8], y=[-8,8])
    translate([x,y,floor]) cylinder(h=1.2,d=peg_d);
}

// Side orientation keeps the tray and its two integral mounting pegs
// support-free on FDM printers.
translate([0,0,12]) rotate([90,0,0]) grove_20x20_carrier();
